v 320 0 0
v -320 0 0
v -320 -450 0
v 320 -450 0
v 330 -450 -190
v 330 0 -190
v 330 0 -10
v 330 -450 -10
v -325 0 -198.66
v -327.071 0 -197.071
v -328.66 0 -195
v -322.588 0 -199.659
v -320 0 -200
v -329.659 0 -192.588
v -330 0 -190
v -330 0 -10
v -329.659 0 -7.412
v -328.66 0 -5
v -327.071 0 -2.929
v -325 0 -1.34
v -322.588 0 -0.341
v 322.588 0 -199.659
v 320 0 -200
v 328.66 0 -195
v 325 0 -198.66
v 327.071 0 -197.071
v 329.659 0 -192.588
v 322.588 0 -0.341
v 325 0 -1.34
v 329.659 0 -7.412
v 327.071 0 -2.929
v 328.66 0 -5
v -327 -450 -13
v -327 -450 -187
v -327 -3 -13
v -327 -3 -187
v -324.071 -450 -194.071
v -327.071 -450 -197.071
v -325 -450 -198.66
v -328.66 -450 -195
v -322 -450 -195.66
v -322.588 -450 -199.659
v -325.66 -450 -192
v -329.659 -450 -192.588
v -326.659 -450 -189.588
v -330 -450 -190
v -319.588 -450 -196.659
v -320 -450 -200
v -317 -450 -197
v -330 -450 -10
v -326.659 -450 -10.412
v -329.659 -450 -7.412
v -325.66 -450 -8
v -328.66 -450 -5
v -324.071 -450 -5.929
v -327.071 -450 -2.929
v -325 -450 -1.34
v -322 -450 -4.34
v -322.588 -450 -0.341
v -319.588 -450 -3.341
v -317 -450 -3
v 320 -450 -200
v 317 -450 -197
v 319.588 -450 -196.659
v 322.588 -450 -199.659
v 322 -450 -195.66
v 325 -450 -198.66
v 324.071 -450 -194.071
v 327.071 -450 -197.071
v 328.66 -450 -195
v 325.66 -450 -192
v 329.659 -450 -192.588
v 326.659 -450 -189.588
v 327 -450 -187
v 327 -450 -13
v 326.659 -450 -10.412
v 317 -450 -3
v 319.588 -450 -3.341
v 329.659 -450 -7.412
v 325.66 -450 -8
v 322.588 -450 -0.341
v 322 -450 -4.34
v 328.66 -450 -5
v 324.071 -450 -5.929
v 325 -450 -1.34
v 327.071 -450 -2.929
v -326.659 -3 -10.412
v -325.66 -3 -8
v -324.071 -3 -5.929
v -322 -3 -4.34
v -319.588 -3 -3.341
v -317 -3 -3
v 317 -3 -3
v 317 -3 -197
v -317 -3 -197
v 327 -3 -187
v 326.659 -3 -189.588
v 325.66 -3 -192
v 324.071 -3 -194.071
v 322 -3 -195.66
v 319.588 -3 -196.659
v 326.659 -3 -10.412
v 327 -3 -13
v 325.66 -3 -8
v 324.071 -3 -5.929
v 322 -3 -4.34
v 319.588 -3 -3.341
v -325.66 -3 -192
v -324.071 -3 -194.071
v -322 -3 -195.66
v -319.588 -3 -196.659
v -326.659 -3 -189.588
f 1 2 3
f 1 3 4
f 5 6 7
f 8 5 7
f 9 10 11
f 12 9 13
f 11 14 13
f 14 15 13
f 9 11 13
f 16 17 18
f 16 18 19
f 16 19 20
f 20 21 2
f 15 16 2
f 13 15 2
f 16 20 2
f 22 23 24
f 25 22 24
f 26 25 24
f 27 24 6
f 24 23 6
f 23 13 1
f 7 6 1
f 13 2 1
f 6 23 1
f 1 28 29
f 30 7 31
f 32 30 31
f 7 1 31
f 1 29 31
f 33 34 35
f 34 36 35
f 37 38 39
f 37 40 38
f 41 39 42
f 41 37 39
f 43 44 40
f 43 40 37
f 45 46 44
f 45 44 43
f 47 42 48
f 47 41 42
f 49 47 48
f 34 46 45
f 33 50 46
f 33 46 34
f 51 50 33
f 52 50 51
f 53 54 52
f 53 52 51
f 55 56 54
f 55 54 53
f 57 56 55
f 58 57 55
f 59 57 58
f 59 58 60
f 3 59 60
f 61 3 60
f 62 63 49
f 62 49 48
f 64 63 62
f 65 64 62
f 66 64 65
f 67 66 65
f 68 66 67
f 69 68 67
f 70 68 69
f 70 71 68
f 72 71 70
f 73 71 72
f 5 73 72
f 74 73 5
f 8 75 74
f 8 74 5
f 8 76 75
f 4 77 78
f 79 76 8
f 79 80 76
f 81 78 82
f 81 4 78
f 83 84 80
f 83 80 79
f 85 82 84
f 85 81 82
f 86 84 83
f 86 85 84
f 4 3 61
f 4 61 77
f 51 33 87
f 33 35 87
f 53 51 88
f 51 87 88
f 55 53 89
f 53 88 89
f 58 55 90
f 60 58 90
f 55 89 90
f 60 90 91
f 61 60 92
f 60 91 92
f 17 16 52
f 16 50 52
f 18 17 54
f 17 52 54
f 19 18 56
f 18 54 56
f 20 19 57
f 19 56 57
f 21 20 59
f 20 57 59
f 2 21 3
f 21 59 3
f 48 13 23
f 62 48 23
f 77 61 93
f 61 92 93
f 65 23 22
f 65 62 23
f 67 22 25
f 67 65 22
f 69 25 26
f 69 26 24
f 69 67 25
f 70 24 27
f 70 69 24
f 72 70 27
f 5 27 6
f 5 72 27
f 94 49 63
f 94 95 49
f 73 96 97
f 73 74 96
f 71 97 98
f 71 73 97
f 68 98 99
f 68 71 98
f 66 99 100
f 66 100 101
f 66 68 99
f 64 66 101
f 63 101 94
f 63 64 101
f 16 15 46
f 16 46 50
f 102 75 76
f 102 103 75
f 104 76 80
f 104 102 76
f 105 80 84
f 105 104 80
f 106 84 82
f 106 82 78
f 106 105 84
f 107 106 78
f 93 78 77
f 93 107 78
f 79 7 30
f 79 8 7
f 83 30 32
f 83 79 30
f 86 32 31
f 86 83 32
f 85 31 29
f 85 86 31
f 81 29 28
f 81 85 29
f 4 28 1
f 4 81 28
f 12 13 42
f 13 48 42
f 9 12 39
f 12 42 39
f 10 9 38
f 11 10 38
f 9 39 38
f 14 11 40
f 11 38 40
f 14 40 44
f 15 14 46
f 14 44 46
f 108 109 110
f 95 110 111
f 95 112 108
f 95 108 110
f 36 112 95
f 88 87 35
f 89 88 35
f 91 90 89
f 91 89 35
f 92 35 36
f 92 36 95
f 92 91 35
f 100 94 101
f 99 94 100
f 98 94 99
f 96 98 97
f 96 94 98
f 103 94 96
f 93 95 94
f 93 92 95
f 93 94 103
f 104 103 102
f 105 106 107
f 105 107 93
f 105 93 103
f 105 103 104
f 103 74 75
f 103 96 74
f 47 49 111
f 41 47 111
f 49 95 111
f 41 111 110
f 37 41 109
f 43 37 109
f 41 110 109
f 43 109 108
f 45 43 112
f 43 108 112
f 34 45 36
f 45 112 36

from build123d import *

# Parameters (mm, degrees)
F3_W     = 660
F3_H     = 200
F4_DEPTH = 450
F5_T     = -3
F6_R     = 10
F7_R     = 10
F8_R     = 10


with BuildPart() as f4:
    # F3 (on Front) → F4 (new body)
    with BuildSketch(Plane.XZ):
        with Locations((0, -100)):
            Rectangle(F3_W, F3_H)
    extrude(amount=F4_DEPTH)

    # F5
    f5_openings = [f4.faces().sort_by_distance(p)[0] for p in [
        (0, -450, -100),
    ]]
    offset(amount=F5_T, openings=f5_openings)

    # F6
    f6_edges = [f4.edges().sort_by_distance(p)[0] for p in [
        (330, -225, -200),
        (330, -225, 0),
    ]]
    fillet(f6_edges, radius=F6_R)

    # F7
    f7_edges = [f4.edges().sort_by_distance(p)[0] for p in [
        (327, -226.5, -197),
        (327, -226.5, -3),
        (-327, -226.5, -197),
        (-327, -226.5, -3),
    ]]
    fillet(f7_edges, radius=F7_R)

    # F8
    f8_edges = [f4.edges().sort_by_distance(p)[0] for p in [
        (-330, -225, -200),
        (-330, -225, 0),
    ]]
    fillet(f8_edges, radius=F8_R)


solid = f4.part
